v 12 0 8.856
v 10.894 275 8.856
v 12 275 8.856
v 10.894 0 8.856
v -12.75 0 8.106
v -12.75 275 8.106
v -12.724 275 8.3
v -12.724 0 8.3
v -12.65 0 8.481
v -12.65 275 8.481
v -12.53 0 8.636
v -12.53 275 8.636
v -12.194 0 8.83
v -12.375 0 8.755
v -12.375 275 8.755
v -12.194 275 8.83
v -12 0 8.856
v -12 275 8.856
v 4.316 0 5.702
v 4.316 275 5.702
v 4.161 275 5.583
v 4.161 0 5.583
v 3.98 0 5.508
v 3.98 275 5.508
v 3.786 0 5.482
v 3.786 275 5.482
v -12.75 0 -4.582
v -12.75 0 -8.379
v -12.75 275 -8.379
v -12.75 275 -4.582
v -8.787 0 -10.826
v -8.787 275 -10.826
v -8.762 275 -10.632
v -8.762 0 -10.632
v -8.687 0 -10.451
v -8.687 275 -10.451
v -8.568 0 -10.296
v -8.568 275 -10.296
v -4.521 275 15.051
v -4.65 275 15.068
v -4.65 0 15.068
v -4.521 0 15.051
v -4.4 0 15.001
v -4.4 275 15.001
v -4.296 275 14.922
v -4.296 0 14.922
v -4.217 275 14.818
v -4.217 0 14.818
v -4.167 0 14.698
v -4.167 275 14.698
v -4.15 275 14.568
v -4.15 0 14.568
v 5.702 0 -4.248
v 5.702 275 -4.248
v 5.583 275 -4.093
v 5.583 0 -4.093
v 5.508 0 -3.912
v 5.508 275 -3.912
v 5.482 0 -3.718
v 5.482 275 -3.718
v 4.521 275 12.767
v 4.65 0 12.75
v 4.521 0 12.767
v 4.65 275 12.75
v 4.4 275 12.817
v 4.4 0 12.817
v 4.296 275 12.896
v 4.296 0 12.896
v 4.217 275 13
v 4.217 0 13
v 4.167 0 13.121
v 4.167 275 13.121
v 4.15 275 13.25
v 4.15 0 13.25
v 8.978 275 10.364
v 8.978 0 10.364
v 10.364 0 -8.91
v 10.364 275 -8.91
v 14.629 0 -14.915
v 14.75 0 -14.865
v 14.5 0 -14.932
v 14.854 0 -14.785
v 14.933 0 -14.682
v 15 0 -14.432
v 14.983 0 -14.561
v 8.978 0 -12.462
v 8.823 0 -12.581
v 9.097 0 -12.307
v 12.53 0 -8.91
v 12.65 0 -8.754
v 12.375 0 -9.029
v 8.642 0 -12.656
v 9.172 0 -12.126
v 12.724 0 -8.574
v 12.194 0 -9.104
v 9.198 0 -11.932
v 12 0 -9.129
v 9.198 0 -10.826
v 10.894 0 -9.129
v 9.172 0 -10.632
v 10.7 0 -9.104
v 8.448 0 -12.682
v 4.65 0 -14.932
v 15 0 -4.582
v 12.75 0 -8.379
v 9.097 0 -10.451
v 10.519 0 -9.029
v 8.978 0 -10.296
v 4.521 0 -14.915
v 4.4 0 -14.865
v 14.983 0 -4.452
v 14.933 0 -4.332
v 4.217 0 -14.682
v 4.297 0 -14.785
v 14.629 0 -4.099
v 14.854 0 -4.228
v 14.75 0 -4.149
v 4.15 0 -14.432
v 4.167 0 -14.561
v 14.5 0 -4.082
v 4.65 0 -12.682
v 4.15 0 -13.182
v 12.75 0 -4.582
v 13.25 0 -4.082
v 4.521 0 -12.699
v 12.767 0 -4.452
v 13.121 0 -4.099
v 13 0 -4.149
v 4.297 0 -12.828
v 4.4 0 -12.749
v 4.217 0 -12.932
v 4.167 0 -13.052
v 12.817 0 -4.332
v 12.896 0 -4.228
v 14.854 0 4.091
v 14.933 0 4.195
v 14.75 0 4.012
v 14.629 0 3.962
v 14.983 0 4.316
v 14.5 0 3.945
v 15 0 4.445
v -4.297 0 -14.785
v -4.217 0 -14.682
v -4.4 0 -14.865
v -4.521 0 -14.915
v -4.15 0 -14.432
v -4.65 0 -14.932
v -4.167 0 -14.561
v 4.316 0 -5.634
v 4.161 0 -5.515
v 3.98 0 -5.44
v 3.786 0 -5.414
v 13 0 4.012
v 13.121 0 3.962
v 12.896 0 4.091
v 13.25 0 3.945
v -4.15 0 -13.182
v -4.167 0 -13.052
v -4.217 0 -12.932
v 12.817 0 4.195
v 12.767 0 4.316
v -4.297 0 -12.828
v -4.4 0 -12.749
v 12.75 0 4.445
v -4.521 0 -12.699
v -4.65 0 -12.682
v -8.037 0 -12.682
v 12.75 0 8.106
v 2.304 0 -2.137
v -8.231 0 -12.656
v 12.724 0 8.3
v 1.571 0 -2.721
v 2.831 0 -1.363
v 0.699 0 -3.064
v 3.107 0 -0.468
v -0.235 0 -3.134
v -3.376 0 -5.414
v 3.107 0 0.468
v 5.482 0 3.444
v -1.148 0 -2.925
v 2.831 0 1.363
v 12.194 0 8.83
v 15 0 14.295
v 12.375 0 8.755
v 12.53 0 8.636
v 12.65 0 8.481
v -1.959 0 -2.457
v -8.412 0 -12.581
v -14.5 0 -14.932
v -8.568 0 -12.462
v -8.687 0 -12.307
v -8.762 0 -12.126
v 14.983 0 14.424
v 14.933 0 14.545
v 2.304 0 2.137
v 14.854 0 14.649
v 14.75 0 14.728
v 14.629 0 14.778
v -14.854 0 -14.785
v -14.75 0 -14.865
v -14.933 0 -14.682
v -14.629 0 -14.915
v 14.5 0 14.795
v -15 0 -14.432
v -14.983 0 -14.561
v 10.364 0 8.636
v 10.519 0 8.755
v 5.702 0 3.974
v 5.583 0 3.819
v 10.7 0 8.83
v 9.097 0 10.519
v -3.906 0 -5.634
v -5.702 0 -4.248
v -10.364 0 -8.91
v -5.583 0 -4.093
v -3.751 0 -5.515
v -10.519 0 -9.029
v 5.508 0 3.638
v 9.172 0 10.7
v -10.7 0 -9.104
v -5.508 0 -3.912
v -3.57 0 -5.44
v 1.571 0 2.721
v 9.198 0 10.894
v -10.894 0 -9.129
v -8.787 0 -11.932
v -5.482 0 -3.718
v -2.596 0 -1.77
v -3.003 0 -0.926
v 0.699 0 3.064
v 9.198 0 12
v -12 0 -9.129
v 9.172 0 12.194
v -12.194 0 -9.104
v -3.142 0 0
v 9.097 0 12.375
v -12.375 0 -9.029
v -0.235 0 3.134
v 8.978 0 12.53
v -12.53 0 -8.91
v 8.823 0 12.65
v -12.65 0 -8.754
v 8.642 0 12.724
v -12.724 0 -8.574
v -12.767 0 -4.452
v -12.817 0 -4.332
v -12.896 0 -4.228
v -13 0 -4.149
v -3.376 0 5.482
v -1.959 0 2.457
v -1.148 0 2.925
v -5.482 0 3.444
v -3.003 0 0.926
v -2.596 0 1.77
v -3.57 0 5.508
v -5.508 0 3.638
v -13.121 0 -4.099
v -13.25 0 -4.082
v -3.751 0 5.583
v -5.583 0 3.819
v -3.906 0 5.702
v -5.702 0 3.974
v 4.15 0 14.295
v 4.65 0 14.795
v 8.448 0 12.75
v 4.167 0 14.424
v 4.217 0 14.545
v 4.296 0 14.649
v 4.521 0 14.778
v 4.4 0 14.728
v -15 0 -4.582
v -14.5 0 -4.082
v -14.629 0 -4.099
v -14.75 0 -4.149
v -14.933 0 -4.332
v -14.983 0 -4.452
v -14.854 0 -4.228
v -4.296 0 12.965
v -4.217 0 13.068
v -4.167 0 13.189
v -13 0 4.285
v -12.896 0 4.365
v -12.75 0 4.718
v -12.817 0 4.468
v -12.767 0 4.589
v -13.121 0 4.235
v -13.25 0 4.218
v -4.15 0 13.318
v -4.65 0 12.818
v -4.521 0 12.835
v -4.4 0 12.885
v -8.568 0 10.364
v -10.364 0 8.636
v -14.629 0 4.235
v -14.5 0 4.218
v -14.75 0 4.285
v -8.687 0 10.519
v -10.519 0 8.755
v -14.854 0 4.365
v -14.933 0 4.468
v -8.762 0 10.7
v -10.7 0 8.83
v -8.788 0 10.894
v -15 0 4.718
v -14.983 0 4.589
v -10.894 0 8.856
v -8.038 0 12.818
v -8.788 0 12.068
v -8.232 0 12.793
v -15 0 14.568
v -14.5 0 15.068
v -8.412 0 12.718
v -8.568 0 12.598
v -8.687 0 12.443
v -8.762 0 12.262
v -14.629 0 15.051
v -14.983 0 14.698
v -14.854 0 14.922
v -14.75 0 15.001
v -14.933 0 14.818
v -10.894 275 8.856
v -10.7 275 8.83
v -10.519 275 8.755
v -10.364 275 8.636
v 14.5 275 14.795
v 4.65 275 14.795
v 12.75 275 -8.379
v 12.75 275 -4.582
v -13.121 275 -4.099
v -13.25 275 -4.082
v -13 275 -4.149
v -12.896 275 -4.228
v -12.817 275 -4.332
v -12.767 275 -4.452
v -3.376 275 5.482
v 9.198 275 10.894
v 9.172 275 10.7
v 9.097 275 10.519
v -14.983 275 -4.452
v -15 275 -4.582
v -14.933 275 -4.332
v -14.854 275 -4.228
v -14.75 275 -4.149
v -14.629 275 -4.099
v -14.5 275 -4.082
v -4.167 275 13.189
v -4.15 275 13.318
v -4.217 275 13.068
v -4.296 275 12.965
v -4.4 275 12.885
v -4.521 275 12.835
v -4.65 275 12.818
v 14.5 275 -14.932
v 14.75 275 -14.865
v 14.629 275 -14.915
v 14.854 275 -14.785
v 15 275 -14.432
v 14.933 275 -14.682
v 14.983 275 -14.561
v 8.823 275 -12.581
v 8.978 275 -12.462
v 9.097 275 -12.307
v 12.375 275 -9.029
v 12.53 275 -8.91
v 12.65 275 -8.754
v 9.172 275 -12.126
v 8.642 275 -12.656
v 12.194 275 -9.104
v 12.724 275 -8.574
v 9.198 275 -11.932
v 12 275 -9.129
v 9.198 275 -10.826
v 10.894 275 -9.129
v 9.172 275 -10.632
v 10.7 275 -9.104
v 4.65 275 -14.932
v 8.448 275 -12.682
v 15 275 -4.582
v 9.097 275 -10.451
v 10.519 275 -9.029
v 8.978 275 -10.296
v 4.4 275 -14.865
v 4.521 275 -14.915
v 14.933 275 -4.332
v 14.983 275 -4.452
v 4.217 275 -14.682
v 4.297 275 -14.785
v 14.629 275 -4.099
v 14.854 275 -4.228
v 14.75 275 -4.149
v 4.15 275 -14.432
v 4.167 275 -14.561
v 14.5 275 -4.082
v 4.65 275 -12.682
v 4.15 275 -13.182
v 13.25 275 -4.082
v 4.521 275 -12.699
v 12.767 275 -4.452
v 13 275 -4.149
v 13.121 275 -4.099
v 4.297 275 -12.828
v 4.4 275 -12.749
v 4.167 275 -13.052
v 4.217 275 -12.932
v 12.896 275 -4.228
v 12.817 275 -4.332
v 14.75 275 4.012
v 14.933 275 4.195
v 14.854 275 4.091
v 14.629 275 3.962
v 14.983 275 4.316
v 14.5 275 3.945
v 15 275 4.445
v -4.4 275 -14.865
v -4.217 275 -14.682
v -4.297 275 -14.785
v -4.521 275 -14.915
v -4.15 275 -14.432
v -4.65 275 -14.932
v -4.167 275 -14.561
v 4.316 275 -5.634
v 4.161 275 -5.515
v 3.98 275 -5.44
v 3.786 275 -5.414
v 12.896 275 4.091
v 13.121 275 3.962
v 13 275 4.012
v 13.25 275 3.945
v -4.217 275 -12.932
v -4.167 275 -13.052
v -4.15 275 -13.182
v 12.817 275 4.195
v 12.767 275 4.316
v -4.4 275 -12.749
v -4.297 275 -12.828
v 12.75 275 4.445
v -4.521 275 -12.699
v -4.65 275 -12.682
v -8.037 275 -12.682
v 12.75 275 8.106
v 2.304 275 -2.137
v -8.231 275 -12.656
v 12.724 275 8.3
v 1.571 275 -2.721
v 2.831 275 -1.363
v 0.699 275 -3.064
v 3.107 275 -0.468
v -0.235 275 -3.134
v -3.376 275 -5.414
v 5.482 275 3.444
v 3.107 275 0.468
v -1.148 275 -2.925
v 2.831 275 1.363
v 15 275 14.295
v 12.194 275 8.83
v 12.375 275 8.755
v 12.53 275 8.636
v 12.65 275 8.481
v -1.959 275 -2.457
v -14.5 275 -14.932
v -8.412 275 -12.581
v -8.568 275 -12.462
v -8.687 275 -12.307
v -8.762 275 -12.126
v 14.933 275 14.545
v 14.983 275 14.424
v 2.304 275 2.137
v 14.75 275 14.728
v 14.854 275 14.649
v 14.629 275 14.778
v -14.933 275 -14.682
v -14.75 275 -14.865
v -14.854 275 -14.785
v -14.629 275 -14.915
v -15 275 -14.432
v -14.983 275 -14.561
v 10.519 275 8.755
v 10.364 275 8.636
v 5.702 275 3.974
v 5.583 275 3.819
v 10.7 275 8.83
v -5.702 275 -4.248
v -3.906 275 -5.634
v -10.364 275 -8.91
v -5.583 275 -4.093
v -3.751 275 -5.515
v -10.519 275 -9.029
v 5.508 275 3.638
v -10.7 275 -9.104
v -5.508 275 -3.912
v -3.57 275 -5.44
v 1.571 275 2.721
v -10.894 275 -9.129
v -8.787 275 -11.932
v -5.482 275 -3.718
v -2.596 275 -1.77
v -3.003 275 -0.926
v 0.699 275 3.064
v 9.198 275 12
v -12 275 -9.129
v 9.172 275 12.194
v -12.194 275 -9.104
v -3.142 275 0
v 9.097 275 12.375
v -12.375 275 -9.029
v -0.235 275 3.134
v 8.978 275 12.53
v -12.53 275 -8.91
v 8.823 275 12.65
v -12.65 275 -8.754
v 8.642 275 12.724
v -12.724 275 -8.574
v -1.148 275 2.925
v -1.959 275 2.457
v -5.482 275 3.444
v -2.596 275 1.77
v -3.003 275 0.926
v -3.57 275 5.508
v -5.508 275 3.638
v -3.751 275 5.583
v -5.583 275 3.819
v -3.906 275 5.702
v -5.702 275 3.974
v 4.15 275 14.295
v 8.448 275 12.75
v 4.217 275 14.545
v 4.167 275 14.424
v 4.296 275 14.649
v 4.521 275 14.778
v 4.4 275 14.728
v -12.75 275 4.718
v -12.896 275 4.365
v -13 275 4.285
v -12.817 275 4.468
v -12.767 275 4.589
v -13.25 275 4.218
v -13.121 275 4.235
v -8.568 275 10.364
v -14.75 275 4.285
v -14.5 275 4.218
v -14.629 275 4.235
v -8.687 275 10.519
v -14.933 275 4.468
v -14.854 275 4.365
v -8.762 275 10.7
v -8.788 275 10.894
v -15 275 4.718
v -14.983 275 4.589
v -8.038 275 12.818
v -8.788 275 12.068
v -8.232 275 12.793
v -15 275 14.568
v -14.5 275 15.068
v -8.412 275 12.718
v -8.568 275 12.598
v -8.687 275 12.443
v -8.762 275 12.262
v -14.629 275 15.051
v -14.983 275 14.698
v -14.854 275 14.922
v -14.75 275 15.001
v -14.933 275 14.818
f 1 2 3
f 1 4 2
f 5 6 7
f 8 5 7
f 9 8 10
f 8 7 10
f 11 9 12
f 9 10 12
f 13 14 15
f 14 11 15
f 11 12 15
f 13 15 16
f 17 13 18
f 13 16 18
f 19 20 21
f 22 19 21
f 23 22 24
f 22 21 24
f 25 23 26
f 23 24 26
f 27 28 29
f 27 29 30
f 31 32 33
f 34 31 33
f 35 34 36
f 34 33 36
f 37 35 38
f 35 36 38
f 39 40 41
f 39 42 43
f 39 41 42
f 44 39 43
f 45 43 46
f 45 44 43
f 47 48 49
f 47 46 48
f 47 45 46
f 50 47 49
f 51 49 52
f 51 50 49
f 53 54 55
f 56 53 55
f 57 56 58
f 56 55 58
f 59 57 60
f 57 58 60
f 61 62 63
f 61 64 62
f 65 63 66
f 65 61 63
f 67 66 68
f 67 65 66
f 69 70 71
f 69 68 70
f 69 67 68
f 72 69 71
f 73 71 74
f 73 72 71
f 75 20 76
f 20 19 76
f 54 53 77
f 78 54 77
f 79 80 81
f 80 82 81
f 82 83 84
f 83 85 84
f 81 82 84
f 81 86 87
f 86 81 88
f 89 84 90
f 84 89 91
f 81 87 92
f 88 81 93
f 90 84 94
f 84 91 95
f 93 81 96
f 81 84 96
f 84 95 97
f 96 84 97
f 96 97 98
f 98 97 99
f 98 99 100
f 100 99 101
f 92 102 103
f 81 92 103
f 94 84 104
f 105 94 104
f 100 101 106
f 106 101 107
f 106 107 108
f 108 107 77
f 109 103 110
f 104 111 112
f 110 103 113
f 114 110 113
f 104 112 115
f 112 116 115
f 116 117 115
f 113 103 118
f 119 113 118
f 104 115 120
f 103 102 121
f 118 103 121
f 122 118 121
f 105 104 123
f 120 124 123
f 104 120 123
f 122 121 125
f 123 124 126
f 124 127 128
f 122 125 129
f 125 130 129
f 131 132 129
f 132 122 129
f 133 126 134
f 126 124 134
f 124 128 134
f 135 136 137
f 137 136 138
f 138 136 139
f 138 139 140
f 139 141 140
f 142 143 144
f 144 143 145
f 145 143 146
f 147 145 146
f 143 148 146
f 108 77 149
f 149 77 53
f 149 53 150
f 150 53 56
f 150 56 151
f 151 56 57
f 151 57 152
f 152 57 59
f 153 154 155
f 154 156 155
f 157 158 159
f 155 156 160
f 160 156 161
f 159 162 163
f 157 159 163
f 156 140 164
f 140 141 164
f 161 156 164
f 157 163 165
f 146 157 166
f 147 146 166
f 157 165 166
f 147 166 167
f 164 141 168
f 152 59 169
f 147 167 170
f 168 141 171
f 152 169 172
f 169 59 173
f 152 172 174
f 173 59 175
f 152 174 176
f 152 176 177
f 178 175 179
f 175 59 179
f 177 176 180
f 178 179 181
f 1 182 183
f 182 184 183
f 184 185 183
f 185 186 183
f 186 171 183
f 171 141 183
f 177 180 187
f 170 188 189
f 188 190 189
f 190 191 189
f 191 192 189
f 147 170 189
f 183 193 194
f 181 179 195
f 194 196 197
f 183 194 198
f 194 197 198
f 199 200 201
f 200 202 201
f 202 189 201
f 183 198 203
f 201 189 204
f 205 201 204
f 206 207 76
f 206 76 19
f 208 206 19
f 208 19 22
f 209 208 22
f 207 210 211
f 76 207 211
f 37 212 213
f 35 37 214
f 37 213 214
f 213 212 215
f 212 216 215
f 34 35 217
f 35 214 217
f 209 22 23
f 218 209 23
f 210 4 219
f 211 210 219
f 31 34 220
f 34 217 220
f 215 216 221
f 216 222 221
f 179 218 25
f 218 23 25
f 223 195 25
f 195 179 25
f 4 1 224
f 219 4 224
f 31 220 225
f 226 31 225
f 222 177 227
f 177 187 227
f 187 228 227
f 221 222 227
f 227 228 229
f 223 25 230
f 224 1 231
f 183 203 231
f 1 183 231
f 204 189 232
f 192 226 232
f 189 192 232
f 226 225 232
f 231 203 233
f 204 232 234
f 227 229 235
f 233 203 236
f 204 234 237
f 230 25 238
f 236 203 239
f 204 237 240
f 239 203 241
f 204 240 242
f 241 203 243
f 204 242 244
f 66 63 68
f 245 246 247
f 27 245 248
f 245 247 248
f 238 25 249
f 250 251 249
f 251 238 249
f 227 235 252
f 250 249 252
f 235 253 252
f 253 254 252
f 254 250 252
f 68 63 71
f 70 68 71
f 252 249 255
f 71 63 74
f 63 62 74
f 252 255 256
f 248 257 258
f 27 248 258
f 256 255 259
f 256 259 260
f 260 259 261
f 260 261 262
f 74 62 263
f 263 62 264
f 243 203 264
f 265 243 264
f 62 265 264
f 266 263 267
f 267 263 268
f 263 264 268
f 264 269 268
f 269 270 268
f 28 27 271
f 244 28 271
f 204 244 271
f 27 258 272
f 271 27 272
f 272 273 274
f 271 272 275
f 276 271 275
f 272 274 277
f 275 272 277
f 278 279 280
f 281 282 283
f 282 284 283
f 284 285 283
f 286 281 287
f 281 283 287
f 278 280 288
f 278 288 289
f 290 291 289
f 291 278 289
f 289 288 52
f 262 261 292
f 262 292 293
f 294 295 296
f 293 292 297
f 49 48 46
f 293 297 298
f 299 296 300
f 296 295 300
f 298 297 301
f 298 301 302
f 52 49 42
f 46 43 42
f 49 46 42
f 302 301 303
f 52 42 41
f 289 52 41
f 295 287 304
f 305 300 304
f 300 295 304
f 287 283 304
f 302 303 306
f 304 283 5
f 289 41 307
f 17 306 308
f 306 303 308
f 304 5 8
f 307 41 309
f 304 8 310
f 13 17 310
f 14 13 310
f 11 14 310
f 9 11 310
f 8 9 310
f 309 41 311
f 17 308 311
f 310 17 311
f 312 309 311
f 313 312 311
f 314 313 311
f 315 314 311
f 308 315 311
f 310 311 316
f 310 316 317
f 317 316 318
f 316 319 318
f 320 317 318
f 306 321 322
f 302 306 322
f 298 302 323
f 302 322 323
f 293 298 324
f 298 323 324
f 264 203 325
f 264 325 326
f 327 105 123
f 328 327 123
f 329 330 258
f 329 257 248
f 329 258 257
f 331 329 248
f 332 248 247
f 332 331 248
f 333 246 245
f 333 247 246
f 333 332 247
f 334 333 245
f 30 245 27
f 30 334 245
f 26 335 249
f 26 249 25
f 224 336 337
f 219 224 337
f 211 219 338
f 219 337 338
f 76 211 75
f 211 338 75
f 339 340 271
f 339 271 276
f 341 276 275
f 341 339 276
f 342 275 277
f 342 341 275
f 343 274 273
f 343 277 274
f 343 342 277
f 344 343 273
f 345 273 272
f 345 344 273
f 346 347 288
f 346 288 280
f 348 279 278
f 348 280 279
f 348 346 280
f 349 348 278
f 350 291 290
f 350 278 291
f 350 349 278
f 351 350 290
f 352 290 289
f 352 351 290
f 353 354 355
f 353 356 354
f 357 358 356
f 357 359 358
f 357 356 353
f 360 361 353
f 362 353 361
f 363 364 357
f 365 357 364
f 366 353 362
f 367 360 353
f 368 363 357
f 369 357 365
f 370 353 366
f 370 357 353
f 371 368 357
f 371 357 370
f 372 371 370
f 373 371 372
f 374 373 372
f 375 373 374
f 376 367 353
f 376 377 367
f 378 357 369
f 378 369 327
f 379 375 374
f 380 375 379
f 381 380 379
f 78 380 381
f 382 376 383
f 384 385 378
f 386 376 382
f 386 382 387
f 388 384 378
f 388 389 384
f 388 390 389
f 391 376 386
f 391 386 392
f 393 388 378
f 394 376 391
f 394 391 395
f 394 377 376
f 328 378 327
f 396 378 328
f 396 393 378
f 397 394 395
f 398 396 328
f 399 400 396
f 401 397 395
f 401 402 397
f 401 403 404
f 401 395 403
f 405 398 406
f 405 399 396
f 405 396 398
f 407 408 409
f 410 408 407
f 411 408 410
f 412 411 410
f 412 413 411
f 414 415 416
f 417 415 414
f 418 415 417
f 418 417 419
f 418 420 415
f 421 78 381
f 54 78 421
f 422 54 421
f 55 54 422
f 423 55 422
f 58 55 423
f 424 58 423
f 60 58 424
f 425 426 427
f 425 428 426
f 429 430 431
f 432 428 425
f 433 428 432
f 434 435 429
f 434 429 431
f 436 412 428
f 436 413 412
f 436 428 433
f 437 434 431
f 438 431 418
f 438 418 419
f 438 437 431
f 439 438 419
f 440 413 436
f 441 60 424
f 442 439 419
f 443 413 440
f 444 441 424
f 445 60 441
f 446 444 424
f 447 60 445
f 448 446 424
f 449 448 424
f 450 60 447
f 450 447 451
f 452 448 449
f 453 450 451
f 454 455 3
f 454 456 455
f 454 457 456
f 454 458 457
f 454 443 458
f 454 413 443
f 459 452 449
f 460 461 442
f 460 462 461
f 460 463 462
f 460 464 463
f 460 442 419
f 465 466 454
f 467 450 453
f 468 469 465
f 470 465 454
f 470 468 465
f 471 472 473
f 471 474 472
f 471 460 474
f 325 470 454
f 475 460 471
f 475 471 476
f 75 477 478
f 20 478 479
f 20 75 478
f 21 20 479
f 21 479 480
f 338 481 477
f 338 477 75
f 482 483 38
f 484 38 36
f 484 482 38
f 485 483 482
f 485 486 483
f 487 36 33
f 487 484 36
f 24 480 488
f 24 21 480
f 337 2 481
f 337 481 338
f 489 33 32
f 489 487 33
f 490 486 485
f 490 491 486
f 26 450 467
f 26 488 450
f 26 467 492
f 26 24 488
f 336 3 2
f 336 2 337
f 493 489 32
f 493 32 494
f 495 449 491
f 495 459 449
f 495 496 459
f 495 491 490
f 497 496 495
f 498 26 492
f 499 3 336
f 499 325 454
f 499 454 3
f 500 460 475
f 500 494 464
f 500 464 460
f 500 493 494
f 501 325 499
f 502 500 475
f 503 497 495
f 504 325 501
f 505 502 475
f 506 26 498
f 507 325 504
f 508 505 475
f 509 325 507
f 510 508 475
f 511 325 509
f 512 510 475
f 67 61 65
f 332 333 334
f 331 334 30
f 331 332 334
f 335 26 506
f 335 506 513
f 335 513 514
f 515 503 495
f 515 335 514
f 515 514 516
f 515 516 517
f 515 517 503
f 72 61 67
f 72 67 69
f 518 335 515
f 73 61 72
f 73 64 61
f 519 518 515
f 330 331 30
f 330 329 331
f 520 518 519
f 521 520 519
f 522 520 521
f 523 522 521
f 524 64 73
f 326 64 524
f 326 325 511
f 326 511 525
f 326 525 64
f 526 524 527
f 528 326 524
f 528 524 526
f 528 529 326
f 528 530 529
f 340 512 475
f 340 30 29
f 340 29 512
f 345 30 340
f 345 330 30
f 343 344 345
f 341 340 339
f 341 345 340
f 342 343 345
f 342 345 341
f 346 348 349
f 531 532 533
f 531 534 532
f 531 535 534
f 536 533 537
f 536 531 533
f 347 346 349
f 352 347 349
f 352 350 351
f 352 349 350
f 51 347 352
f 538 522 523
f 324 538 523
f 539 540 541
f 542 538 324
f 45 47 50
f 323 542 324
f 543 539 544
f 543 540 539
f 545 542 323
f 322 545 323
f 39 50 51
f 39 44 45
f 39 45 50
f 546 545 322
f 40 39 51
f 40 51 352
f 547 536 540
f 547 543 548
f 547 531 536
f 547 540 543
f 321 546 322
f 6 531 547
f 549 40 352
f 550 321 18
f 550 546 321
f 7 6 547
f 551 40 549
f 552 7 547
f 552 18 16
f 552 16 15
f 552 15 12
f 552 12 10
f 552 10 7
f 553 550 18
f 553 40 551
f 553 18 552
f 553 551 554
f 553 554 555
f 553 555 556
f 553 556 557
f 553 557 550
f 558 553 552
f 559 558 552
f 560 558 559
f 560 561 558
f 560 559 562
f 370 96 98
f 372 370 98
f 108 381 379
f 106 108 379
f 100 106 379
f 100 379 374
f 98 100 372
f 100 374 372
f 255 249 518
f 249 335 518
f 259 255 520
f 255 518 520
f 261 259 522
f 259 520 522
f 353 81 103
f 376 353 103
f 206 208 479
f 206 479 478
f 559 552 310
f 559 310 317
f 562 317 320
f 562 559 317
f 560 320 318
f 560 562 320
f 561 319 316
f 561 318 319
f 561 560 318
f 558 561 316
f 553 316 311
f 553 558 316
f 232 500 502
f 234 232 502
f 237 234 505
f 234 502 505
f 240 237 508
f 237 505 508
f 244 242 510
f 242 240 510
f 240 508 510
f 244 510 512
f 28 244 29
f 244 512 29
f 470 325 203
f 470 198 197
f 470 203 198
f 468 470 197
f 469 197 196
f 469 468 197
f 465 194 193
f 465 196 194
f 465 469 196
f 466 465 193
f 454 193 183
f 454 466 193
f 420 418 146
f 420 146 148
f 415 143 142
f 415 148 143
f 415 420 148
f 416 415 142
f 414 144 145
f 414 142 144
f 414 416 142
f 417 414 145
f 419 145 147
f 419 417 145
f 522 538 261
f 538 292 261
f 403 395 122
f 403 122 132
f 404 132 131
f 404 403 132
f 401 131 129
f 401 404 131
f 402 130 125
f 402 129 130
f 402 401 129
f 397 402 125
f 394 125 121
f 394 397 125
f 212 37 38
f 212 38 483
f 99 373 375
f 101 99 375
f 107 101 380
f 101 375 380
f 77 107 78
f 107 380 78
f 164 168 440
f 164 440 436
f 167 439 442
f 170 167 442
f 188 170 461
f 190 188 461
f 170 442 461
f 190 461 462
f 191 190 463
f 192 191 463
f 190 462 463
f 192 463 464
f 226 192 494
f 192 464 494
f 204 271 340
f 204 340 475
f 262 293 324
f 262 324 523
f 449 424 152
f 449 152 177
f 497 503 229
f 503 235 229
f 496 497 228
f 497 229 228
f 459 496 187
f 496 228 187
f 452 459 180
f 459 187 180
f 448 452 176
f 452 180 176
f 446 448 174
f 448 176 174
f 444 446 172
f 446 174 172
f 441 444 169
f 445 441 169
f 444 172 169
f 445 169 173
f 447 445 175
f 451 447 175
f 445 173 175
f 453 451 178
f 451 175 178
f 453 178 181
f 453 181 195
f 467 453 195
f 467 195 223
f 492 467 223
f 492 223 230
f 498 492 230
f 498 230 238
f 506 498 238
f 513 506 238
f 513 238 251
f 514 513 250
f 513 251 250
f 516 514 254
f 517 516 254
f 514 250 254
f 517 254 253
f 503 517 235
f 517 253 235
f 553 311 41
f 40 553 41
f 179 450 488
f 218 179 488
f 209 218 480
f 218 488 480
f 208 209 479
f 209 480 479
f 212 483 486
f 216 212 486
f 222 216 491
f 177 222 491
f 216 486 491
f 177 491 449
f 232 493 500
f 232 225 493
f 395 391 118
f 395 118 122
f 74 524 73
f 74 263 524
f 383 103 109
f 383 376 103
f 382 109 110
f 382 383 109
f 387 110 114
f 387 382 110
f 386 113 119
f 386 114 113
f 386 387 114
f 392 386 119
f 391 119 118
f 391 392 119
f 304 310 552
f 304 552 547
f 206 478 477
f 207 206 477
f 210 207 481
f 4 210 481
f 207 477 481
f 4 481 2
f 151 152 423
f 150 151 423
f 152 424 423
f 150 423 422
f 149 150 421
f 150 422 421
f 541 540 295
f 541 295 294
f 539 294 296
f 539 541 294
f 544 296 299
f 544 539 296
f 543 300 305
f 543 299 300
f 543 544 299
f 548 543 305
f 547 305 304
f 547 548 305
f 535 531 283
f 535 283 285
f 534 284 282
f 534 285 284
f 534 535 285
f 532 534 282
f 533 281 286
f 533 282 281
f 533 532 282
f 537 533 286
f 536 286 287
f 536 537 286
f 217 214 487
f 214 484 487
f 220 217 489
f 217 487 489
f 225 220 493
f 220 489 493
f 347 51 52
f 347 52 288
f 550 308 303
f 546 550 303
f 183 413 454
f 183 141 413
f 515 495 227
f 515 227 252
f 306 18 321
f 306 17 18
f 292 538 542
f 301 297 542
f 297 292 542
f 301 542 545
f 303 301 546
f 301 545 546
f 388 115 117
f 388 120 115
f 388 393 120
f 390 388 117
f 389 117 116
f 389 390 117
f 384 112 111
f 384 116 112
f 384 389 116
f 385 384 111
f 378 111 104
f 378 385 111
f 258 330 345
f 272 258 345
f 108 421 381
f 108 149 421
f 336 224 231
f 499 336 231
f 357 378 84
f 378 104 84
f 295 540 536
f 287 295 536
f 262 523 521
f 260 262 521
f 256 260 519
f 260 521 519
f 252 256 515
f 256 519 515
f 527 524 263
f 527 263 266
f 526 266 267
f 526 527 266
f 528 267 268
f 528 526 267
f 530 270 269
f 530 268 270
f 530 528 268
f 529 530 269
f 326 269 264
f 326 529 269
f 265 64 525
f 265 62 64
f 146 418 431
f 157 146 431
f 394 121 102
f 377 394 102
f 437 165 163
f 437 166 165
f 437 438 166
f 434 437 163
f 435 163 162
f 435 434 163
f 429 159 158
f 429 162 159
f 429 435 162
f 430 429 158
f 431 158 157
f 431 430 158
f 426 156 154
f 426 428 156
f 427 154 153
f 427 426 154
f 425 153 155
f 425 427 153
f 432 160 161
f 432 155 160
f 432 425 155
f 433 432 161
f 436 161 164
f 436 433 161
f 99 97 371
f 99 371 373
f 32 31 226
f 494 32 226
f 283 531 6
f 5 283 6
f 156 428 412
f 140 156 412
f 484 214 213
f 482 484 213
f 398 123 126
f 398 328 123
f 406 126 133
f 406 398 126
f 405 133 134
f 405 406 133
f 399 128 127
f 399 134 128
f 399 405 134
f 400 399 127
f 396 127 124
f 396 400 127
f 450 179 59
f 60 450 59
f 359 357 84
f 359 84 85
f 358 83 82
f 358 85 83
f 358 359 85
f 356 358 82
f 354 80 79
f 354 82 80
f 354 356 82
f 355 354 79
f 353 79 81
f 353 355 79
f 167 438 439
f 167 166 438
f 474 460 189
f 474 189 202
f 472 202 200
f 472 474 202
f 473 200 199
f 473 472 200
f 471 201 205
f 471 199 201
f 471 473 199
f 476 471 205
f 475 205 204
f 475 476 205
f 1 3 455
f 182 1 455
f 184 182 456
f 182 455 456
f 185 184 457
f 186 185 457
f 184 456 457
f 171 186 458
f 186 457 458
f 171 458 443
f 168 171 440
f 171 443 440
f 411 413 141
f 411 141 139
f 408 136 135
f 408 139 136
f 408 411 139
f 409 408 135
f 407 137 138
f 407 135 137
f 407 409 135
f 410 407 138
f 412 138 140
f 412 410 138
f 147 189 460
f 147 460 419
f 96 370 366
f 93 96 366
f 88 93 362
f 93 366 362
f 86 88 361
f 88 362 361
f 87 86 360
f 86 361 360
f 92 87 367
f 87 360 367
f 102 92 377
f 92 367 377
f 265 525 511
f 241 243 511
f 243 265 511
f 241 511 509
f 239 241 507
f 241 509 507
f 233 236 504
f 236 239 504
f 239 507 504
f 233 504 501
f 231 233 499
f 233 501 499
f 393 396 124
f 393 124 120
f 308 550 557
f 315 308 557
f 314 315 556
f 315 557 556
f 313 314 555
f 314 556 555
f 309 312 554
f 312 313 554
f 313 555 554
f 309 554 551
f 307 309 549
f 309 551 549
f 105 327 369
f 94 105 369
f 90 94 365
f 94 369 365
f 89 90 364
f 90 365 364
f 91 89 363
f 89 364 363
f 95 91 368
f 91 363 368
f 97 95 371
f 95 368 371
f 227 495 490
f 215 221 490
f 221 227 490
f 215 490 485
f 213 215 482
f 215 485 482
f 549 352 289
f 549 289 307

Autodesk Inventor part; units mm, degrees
ref_plane "YZ Plane" through (0, 0, 0) normal (1, 0, 0) x (0, 1, 0)
ref_plane "XZ Plane" through (0, 0, 0) normal (0, 1, 0) x (-1, 0, 0)
ref_plane "XY Plane" through (0, 0, 0) normal (0, 0, 1) x (1, 0, 0)
sketch "Sketch1" plane through (0, 0, 0) normal (0, 1, 0) x (-1, 0, 0)
  line L0 (0, -21.0136) -> (0, 21.0817) projected
  line L1 (-21, 0) -> (21, 0) projected
  line L2 (21, 0) -> (-21, 0) projected
  line L3 (0, -21.0136) -> (0, 21.0817) projected
  line L4 (3.6865, 5.4825) -> (-4.0965, 5.4825)
  line L5 (-5.4825, 3.7546) -> (-5.4825, -4.0284)
  line L6 (-4.0967, -5.4144) -> (3.6863, -5.4144)
  line L7 (5.4825, -4.0284) -> (5.4825, 3.7546)
  line L8 (-5.4825, 5.4825) -> (5.4825, -5.4825) construction
  line L9 (15, 15.0681) -> (15, 4.2181)
  line L10 (15, 4.2181) -> (12.75, 4.2181)
  line L11 (15, 15.0681) -> (4.15, 15.0681)
  line L12 (4.15, 15.0681) -> (4.15, 12.8181)
  line L13 (-15, 14.795) -> (-4.15, 14.795)
  line L14 (-4.15, 14.795) -> (-4.15, 12.75)
  line L15 (-15, 12.75) -> (-15, 14.795)
  line L16 (-15, 14.795) -> (-12.75, 14.795)
  line L17 (-12.75, 3.945) -> (-15, 3.945)
  line L18 (-15, 3.945) -> (-15, 14.795)
  line L19 (-15, -14.9319) -> (-12.75, -14.9319)
  line L20 (-12.75, -4.0819) -> (-15, -4.0819)
  line L21 (-15, -4.0819) -> (-15, -14.9319)
  line L22 (-15, -14.9319) -> (-4.1502, -14.9319)
  line L23 (-4.1502, -14.9319) -> (-4.1502, -12.6819)
  line L24 (-15, -12.7481) -> (-15, -14.9319)
  line L25 (15, -14.9319) -> (12.75, -14.9319)
  line L26 (12.75, -4.0819) -> (15, -4.0819)
  line L27 (15, -4.0819) -> (15, -14.9319)
  line L28 (15, -14.9319) -> (4.1502, -14.9319)
  line L29 (4.1502, -14.9319) -> (4.1502, -12.6819)
  line L30 (15, -12.7481) -> (15, -14.9319)
  circle A0 centre (0, 0) radius 3.1425
  line L31 (8.9925, -14.9319) -> (4.1502, -14.9319)
  line L32 (-4.1502, -14.9319) -> (-8.9925, -14.9319)
  line L33 (15, -14.9319) -> (4.1502, -14.9319)
  line L34 (-4.1502, -14.9319) -> (-15, -14.9319)
  line L35 (15, -8.9925) -> (15, -4.0819)
  line L36 (15, 4.2181) -> (15, 9.0606)
  line L37 (15, 15.0681) -> (15, 4.2181)
  line L38 (15, -4.0819) -> (15, -14.9319)
  line L39 (-8.9925, 14.795) -> (-4.15, 14.795)
  line L40 (4.15, 15.0681) -> (8.9925, 15.0681)
  line L41 (-15, 14.795) -> (-4.15, 14.795)
  line L42 (4.15, 15.0681) -> (15, 15.0681)
  line L43 (-15, 8.9925) -> (-15, 3.945)
  line L44 (-15, -4.0819) -> (-15, -8.9925)
  line L45 (-15, -14.9319) -> (-15, -4.0819)
  line L46 (-15, 3.945) -> (-15, 14.795)
  line L47 (-4.1502, -12.6819) -> (-9.1977, -12.6819)
  line L48 (-12.75, -9.1294) -> (-12.75, -4.0819)
  line L49 (-12.75, -9.1294) -> (-10.5835, -9.1294)
  line L50 (-9.1977, -12.6819) -> (-9.1977, -10.5154)
  line L51 (-9.1975, 10.5835) -> (-9.1975, 12.75)
  line L52 (4.15, 12.8181) -> (8.7875, 12.8181)
  line L53 (12.75, 4.2181) -> (12.75, 8.8556)
  line L54 (12.75, 8.8556) -> (10.5835, 8.8556)
  line L55 (8.7875, 12.8181) -> (8.7875, 10.5835)
  line L56 (4.1502, -12.6819) -> (8.7873, -12.6819)
  line L57 (14.341, -12.7481) -> (15, -12.7481)
  line L58 (12.75, -14.9319) -> (12.75, -14.2729)
  line L59 (12.75, -9.1294) -> (12.75, -4.0819)
  line L60 (10.5835, -9.1294) -> (12.75, -9.1294)
  line L61 (8.7873, -10.5154) -> (8.7873, -12.6819)
  line L62 (5.4825, 5.4825) -> (-0.7955, -0.7955) construction
  line L63 (-2.2221, -2.2221) -> (-5.4825, -5.4825) construction
  line L64 (-12.75, 14.795) -> (-12.75, 14.136)
  line L65 (-12.75, 8.8556) -> (-12.75, 3.945)
  line L66 (-4.15, 12.75) -> (-9.1975, 12.75)
  line L67 (-14.341, 12.75) -> (-15, 12.75)
  line L68 (-10.5835, 8.8556) -> (-12.75, 8.8556)
  line L69 (-5.4825, 3.7546) -> (-10.5835, 8.8556)
  line L70 (-4.0965, 5.4825) -> (-9.1975, 10.5835)
  line L71 (8.7875, 10.5835) -> (3.6865, 5.4825)
  line L72 (10.5835, 8.8556) -> (5.4825, 3.7546)
  line L73 (10.5835, -9.1294) -> (5.4825, -4.0284)
  line L74 (8.7873, -10.5154) -> (3.6863, -5.4144)
  line L75 (-4.0967, -5.4144) -> (-9.1977, -10.5154)
  line L76 (-5.4825, -4.0284) -> (-10.5835, -9.1294)
  line L77 (15, 15) -> (-15, -15) construction
  line L78 (-15, 15) -> (15, -15) construction
  point P0 (-15, 0)
  dimension "d26" = 6.285
  dimension "d0" = 30
  dimension "d1" = 30
  dimension "d2" = 10.965
  dimension "d3" = 10.965
  dimension "d4" = 30
  dimension "d5" = 17.985
  dimension "d6" = 17.985
  dimension "d11" = 10.85
  dimension "d12" = 2.25
  dimension "d13" = 10.85
  dimension "d14" = 2.25
  dimension "d15" = 10.85
  dimension "d16" = 2.25
  dimension "d17" = 10.85
  dimension "d18" = 2.25
  dimension "d19" = 10.85
  dimension "d20" = 10.85
  dimension "d21" = 2.25
  dimension "d22" = 2.25
  dimension "d23" = 10.85
  dimension "d24" = 10.85
  dimension "d25" = 2.25
  dimension "d31" = 30
  dimension "d32" = 30
extrude "Extrusion1" add sketch "Sketch1" along normal blind 275 contours L6 L75 L50 L47 L23 L22 L19 L21 L20 L48 L49 L76 L5 L1 A0 L0 | L0 A0 L1 L7 L73 L60 L59 L26 L27 L25 L28 L29 L56 L61 L74 L6 | L1 L5 L69 L68 L65 L17 L18 L15 L13 L14 L66 L51 L70 L4 L0 A0 | A0 L0 L4 L71 L55 L52 L12 L11 L9 L10 L53 L54 L72 L7 L1
fillet "Fillet1" radius 0.5 20 edges at (15, 137.5, 14.795) (4.15, 137.5, 14.795) (-4.15, 137.5, 15.0681) (-4.15, 137.5, 12.8181) (15, 137.5, 3.945) (12.75, 137.5, 3.945) (15, 137.5, -4.0819) (12.75, 137.5, -4.0819) (15, 137.5, -14.9319) (4.1502, 137.5, -12.6819) (-4.1502, 137.5, -14.9319) (-4.1502, 137.5, -12.6819) (4.1502, 137.5, -14.9319) (-15, 137.5, -14.9319) (-12.75, 137.5, -4.0819) (-15, 137.5, -4.0819) (-12.75, 137.5, 4.2181) (-15, 137.5, 4.2181) (-15, 137.5, 15.0681) (4.15, 137.5, 12.75)
fillet "Fillet2" radius 0.75 24 edges at (-10.5835, 137.5, 8.8556) (-5.4825, 137.5, 3.7546) (-12.75, 137.5, -9.1294) (-10.5835, 137.5, -9.1294) (-8.7873, 137.5, -12.6819) (5.4825, 137.5, -4.0284) (10.5835, 137.5, -9.1294) (-3.6865, 137.5, 5.4825) (-8.7875, 137.5, 10.5835) (5.4825, 137.5, 3.7546) (10.5835, 137.5, 8.8556) (12.75, 137.5, 8.8556) (12.75, 137.5, -9.1294) (4.0965, 137.5, 5.4825) (9.1975, 137.5, 10.5835) (9.1975, 137.5, 12.75) (-8.7875, 137.5, 12.8181) (-12.75, 137.5, 8.8556) (4.0967, 137.5, -5.4144) (9.1977, 137.5, -10.5154) (9.1977, 137.5, -12.6819) (-8.7873, 137.5, -10.5154) (-3.6863, 137.5, -5.4144) (-5.4825, 137.5, -4.0284)
properties part number "Profile_30mm_275mm"
